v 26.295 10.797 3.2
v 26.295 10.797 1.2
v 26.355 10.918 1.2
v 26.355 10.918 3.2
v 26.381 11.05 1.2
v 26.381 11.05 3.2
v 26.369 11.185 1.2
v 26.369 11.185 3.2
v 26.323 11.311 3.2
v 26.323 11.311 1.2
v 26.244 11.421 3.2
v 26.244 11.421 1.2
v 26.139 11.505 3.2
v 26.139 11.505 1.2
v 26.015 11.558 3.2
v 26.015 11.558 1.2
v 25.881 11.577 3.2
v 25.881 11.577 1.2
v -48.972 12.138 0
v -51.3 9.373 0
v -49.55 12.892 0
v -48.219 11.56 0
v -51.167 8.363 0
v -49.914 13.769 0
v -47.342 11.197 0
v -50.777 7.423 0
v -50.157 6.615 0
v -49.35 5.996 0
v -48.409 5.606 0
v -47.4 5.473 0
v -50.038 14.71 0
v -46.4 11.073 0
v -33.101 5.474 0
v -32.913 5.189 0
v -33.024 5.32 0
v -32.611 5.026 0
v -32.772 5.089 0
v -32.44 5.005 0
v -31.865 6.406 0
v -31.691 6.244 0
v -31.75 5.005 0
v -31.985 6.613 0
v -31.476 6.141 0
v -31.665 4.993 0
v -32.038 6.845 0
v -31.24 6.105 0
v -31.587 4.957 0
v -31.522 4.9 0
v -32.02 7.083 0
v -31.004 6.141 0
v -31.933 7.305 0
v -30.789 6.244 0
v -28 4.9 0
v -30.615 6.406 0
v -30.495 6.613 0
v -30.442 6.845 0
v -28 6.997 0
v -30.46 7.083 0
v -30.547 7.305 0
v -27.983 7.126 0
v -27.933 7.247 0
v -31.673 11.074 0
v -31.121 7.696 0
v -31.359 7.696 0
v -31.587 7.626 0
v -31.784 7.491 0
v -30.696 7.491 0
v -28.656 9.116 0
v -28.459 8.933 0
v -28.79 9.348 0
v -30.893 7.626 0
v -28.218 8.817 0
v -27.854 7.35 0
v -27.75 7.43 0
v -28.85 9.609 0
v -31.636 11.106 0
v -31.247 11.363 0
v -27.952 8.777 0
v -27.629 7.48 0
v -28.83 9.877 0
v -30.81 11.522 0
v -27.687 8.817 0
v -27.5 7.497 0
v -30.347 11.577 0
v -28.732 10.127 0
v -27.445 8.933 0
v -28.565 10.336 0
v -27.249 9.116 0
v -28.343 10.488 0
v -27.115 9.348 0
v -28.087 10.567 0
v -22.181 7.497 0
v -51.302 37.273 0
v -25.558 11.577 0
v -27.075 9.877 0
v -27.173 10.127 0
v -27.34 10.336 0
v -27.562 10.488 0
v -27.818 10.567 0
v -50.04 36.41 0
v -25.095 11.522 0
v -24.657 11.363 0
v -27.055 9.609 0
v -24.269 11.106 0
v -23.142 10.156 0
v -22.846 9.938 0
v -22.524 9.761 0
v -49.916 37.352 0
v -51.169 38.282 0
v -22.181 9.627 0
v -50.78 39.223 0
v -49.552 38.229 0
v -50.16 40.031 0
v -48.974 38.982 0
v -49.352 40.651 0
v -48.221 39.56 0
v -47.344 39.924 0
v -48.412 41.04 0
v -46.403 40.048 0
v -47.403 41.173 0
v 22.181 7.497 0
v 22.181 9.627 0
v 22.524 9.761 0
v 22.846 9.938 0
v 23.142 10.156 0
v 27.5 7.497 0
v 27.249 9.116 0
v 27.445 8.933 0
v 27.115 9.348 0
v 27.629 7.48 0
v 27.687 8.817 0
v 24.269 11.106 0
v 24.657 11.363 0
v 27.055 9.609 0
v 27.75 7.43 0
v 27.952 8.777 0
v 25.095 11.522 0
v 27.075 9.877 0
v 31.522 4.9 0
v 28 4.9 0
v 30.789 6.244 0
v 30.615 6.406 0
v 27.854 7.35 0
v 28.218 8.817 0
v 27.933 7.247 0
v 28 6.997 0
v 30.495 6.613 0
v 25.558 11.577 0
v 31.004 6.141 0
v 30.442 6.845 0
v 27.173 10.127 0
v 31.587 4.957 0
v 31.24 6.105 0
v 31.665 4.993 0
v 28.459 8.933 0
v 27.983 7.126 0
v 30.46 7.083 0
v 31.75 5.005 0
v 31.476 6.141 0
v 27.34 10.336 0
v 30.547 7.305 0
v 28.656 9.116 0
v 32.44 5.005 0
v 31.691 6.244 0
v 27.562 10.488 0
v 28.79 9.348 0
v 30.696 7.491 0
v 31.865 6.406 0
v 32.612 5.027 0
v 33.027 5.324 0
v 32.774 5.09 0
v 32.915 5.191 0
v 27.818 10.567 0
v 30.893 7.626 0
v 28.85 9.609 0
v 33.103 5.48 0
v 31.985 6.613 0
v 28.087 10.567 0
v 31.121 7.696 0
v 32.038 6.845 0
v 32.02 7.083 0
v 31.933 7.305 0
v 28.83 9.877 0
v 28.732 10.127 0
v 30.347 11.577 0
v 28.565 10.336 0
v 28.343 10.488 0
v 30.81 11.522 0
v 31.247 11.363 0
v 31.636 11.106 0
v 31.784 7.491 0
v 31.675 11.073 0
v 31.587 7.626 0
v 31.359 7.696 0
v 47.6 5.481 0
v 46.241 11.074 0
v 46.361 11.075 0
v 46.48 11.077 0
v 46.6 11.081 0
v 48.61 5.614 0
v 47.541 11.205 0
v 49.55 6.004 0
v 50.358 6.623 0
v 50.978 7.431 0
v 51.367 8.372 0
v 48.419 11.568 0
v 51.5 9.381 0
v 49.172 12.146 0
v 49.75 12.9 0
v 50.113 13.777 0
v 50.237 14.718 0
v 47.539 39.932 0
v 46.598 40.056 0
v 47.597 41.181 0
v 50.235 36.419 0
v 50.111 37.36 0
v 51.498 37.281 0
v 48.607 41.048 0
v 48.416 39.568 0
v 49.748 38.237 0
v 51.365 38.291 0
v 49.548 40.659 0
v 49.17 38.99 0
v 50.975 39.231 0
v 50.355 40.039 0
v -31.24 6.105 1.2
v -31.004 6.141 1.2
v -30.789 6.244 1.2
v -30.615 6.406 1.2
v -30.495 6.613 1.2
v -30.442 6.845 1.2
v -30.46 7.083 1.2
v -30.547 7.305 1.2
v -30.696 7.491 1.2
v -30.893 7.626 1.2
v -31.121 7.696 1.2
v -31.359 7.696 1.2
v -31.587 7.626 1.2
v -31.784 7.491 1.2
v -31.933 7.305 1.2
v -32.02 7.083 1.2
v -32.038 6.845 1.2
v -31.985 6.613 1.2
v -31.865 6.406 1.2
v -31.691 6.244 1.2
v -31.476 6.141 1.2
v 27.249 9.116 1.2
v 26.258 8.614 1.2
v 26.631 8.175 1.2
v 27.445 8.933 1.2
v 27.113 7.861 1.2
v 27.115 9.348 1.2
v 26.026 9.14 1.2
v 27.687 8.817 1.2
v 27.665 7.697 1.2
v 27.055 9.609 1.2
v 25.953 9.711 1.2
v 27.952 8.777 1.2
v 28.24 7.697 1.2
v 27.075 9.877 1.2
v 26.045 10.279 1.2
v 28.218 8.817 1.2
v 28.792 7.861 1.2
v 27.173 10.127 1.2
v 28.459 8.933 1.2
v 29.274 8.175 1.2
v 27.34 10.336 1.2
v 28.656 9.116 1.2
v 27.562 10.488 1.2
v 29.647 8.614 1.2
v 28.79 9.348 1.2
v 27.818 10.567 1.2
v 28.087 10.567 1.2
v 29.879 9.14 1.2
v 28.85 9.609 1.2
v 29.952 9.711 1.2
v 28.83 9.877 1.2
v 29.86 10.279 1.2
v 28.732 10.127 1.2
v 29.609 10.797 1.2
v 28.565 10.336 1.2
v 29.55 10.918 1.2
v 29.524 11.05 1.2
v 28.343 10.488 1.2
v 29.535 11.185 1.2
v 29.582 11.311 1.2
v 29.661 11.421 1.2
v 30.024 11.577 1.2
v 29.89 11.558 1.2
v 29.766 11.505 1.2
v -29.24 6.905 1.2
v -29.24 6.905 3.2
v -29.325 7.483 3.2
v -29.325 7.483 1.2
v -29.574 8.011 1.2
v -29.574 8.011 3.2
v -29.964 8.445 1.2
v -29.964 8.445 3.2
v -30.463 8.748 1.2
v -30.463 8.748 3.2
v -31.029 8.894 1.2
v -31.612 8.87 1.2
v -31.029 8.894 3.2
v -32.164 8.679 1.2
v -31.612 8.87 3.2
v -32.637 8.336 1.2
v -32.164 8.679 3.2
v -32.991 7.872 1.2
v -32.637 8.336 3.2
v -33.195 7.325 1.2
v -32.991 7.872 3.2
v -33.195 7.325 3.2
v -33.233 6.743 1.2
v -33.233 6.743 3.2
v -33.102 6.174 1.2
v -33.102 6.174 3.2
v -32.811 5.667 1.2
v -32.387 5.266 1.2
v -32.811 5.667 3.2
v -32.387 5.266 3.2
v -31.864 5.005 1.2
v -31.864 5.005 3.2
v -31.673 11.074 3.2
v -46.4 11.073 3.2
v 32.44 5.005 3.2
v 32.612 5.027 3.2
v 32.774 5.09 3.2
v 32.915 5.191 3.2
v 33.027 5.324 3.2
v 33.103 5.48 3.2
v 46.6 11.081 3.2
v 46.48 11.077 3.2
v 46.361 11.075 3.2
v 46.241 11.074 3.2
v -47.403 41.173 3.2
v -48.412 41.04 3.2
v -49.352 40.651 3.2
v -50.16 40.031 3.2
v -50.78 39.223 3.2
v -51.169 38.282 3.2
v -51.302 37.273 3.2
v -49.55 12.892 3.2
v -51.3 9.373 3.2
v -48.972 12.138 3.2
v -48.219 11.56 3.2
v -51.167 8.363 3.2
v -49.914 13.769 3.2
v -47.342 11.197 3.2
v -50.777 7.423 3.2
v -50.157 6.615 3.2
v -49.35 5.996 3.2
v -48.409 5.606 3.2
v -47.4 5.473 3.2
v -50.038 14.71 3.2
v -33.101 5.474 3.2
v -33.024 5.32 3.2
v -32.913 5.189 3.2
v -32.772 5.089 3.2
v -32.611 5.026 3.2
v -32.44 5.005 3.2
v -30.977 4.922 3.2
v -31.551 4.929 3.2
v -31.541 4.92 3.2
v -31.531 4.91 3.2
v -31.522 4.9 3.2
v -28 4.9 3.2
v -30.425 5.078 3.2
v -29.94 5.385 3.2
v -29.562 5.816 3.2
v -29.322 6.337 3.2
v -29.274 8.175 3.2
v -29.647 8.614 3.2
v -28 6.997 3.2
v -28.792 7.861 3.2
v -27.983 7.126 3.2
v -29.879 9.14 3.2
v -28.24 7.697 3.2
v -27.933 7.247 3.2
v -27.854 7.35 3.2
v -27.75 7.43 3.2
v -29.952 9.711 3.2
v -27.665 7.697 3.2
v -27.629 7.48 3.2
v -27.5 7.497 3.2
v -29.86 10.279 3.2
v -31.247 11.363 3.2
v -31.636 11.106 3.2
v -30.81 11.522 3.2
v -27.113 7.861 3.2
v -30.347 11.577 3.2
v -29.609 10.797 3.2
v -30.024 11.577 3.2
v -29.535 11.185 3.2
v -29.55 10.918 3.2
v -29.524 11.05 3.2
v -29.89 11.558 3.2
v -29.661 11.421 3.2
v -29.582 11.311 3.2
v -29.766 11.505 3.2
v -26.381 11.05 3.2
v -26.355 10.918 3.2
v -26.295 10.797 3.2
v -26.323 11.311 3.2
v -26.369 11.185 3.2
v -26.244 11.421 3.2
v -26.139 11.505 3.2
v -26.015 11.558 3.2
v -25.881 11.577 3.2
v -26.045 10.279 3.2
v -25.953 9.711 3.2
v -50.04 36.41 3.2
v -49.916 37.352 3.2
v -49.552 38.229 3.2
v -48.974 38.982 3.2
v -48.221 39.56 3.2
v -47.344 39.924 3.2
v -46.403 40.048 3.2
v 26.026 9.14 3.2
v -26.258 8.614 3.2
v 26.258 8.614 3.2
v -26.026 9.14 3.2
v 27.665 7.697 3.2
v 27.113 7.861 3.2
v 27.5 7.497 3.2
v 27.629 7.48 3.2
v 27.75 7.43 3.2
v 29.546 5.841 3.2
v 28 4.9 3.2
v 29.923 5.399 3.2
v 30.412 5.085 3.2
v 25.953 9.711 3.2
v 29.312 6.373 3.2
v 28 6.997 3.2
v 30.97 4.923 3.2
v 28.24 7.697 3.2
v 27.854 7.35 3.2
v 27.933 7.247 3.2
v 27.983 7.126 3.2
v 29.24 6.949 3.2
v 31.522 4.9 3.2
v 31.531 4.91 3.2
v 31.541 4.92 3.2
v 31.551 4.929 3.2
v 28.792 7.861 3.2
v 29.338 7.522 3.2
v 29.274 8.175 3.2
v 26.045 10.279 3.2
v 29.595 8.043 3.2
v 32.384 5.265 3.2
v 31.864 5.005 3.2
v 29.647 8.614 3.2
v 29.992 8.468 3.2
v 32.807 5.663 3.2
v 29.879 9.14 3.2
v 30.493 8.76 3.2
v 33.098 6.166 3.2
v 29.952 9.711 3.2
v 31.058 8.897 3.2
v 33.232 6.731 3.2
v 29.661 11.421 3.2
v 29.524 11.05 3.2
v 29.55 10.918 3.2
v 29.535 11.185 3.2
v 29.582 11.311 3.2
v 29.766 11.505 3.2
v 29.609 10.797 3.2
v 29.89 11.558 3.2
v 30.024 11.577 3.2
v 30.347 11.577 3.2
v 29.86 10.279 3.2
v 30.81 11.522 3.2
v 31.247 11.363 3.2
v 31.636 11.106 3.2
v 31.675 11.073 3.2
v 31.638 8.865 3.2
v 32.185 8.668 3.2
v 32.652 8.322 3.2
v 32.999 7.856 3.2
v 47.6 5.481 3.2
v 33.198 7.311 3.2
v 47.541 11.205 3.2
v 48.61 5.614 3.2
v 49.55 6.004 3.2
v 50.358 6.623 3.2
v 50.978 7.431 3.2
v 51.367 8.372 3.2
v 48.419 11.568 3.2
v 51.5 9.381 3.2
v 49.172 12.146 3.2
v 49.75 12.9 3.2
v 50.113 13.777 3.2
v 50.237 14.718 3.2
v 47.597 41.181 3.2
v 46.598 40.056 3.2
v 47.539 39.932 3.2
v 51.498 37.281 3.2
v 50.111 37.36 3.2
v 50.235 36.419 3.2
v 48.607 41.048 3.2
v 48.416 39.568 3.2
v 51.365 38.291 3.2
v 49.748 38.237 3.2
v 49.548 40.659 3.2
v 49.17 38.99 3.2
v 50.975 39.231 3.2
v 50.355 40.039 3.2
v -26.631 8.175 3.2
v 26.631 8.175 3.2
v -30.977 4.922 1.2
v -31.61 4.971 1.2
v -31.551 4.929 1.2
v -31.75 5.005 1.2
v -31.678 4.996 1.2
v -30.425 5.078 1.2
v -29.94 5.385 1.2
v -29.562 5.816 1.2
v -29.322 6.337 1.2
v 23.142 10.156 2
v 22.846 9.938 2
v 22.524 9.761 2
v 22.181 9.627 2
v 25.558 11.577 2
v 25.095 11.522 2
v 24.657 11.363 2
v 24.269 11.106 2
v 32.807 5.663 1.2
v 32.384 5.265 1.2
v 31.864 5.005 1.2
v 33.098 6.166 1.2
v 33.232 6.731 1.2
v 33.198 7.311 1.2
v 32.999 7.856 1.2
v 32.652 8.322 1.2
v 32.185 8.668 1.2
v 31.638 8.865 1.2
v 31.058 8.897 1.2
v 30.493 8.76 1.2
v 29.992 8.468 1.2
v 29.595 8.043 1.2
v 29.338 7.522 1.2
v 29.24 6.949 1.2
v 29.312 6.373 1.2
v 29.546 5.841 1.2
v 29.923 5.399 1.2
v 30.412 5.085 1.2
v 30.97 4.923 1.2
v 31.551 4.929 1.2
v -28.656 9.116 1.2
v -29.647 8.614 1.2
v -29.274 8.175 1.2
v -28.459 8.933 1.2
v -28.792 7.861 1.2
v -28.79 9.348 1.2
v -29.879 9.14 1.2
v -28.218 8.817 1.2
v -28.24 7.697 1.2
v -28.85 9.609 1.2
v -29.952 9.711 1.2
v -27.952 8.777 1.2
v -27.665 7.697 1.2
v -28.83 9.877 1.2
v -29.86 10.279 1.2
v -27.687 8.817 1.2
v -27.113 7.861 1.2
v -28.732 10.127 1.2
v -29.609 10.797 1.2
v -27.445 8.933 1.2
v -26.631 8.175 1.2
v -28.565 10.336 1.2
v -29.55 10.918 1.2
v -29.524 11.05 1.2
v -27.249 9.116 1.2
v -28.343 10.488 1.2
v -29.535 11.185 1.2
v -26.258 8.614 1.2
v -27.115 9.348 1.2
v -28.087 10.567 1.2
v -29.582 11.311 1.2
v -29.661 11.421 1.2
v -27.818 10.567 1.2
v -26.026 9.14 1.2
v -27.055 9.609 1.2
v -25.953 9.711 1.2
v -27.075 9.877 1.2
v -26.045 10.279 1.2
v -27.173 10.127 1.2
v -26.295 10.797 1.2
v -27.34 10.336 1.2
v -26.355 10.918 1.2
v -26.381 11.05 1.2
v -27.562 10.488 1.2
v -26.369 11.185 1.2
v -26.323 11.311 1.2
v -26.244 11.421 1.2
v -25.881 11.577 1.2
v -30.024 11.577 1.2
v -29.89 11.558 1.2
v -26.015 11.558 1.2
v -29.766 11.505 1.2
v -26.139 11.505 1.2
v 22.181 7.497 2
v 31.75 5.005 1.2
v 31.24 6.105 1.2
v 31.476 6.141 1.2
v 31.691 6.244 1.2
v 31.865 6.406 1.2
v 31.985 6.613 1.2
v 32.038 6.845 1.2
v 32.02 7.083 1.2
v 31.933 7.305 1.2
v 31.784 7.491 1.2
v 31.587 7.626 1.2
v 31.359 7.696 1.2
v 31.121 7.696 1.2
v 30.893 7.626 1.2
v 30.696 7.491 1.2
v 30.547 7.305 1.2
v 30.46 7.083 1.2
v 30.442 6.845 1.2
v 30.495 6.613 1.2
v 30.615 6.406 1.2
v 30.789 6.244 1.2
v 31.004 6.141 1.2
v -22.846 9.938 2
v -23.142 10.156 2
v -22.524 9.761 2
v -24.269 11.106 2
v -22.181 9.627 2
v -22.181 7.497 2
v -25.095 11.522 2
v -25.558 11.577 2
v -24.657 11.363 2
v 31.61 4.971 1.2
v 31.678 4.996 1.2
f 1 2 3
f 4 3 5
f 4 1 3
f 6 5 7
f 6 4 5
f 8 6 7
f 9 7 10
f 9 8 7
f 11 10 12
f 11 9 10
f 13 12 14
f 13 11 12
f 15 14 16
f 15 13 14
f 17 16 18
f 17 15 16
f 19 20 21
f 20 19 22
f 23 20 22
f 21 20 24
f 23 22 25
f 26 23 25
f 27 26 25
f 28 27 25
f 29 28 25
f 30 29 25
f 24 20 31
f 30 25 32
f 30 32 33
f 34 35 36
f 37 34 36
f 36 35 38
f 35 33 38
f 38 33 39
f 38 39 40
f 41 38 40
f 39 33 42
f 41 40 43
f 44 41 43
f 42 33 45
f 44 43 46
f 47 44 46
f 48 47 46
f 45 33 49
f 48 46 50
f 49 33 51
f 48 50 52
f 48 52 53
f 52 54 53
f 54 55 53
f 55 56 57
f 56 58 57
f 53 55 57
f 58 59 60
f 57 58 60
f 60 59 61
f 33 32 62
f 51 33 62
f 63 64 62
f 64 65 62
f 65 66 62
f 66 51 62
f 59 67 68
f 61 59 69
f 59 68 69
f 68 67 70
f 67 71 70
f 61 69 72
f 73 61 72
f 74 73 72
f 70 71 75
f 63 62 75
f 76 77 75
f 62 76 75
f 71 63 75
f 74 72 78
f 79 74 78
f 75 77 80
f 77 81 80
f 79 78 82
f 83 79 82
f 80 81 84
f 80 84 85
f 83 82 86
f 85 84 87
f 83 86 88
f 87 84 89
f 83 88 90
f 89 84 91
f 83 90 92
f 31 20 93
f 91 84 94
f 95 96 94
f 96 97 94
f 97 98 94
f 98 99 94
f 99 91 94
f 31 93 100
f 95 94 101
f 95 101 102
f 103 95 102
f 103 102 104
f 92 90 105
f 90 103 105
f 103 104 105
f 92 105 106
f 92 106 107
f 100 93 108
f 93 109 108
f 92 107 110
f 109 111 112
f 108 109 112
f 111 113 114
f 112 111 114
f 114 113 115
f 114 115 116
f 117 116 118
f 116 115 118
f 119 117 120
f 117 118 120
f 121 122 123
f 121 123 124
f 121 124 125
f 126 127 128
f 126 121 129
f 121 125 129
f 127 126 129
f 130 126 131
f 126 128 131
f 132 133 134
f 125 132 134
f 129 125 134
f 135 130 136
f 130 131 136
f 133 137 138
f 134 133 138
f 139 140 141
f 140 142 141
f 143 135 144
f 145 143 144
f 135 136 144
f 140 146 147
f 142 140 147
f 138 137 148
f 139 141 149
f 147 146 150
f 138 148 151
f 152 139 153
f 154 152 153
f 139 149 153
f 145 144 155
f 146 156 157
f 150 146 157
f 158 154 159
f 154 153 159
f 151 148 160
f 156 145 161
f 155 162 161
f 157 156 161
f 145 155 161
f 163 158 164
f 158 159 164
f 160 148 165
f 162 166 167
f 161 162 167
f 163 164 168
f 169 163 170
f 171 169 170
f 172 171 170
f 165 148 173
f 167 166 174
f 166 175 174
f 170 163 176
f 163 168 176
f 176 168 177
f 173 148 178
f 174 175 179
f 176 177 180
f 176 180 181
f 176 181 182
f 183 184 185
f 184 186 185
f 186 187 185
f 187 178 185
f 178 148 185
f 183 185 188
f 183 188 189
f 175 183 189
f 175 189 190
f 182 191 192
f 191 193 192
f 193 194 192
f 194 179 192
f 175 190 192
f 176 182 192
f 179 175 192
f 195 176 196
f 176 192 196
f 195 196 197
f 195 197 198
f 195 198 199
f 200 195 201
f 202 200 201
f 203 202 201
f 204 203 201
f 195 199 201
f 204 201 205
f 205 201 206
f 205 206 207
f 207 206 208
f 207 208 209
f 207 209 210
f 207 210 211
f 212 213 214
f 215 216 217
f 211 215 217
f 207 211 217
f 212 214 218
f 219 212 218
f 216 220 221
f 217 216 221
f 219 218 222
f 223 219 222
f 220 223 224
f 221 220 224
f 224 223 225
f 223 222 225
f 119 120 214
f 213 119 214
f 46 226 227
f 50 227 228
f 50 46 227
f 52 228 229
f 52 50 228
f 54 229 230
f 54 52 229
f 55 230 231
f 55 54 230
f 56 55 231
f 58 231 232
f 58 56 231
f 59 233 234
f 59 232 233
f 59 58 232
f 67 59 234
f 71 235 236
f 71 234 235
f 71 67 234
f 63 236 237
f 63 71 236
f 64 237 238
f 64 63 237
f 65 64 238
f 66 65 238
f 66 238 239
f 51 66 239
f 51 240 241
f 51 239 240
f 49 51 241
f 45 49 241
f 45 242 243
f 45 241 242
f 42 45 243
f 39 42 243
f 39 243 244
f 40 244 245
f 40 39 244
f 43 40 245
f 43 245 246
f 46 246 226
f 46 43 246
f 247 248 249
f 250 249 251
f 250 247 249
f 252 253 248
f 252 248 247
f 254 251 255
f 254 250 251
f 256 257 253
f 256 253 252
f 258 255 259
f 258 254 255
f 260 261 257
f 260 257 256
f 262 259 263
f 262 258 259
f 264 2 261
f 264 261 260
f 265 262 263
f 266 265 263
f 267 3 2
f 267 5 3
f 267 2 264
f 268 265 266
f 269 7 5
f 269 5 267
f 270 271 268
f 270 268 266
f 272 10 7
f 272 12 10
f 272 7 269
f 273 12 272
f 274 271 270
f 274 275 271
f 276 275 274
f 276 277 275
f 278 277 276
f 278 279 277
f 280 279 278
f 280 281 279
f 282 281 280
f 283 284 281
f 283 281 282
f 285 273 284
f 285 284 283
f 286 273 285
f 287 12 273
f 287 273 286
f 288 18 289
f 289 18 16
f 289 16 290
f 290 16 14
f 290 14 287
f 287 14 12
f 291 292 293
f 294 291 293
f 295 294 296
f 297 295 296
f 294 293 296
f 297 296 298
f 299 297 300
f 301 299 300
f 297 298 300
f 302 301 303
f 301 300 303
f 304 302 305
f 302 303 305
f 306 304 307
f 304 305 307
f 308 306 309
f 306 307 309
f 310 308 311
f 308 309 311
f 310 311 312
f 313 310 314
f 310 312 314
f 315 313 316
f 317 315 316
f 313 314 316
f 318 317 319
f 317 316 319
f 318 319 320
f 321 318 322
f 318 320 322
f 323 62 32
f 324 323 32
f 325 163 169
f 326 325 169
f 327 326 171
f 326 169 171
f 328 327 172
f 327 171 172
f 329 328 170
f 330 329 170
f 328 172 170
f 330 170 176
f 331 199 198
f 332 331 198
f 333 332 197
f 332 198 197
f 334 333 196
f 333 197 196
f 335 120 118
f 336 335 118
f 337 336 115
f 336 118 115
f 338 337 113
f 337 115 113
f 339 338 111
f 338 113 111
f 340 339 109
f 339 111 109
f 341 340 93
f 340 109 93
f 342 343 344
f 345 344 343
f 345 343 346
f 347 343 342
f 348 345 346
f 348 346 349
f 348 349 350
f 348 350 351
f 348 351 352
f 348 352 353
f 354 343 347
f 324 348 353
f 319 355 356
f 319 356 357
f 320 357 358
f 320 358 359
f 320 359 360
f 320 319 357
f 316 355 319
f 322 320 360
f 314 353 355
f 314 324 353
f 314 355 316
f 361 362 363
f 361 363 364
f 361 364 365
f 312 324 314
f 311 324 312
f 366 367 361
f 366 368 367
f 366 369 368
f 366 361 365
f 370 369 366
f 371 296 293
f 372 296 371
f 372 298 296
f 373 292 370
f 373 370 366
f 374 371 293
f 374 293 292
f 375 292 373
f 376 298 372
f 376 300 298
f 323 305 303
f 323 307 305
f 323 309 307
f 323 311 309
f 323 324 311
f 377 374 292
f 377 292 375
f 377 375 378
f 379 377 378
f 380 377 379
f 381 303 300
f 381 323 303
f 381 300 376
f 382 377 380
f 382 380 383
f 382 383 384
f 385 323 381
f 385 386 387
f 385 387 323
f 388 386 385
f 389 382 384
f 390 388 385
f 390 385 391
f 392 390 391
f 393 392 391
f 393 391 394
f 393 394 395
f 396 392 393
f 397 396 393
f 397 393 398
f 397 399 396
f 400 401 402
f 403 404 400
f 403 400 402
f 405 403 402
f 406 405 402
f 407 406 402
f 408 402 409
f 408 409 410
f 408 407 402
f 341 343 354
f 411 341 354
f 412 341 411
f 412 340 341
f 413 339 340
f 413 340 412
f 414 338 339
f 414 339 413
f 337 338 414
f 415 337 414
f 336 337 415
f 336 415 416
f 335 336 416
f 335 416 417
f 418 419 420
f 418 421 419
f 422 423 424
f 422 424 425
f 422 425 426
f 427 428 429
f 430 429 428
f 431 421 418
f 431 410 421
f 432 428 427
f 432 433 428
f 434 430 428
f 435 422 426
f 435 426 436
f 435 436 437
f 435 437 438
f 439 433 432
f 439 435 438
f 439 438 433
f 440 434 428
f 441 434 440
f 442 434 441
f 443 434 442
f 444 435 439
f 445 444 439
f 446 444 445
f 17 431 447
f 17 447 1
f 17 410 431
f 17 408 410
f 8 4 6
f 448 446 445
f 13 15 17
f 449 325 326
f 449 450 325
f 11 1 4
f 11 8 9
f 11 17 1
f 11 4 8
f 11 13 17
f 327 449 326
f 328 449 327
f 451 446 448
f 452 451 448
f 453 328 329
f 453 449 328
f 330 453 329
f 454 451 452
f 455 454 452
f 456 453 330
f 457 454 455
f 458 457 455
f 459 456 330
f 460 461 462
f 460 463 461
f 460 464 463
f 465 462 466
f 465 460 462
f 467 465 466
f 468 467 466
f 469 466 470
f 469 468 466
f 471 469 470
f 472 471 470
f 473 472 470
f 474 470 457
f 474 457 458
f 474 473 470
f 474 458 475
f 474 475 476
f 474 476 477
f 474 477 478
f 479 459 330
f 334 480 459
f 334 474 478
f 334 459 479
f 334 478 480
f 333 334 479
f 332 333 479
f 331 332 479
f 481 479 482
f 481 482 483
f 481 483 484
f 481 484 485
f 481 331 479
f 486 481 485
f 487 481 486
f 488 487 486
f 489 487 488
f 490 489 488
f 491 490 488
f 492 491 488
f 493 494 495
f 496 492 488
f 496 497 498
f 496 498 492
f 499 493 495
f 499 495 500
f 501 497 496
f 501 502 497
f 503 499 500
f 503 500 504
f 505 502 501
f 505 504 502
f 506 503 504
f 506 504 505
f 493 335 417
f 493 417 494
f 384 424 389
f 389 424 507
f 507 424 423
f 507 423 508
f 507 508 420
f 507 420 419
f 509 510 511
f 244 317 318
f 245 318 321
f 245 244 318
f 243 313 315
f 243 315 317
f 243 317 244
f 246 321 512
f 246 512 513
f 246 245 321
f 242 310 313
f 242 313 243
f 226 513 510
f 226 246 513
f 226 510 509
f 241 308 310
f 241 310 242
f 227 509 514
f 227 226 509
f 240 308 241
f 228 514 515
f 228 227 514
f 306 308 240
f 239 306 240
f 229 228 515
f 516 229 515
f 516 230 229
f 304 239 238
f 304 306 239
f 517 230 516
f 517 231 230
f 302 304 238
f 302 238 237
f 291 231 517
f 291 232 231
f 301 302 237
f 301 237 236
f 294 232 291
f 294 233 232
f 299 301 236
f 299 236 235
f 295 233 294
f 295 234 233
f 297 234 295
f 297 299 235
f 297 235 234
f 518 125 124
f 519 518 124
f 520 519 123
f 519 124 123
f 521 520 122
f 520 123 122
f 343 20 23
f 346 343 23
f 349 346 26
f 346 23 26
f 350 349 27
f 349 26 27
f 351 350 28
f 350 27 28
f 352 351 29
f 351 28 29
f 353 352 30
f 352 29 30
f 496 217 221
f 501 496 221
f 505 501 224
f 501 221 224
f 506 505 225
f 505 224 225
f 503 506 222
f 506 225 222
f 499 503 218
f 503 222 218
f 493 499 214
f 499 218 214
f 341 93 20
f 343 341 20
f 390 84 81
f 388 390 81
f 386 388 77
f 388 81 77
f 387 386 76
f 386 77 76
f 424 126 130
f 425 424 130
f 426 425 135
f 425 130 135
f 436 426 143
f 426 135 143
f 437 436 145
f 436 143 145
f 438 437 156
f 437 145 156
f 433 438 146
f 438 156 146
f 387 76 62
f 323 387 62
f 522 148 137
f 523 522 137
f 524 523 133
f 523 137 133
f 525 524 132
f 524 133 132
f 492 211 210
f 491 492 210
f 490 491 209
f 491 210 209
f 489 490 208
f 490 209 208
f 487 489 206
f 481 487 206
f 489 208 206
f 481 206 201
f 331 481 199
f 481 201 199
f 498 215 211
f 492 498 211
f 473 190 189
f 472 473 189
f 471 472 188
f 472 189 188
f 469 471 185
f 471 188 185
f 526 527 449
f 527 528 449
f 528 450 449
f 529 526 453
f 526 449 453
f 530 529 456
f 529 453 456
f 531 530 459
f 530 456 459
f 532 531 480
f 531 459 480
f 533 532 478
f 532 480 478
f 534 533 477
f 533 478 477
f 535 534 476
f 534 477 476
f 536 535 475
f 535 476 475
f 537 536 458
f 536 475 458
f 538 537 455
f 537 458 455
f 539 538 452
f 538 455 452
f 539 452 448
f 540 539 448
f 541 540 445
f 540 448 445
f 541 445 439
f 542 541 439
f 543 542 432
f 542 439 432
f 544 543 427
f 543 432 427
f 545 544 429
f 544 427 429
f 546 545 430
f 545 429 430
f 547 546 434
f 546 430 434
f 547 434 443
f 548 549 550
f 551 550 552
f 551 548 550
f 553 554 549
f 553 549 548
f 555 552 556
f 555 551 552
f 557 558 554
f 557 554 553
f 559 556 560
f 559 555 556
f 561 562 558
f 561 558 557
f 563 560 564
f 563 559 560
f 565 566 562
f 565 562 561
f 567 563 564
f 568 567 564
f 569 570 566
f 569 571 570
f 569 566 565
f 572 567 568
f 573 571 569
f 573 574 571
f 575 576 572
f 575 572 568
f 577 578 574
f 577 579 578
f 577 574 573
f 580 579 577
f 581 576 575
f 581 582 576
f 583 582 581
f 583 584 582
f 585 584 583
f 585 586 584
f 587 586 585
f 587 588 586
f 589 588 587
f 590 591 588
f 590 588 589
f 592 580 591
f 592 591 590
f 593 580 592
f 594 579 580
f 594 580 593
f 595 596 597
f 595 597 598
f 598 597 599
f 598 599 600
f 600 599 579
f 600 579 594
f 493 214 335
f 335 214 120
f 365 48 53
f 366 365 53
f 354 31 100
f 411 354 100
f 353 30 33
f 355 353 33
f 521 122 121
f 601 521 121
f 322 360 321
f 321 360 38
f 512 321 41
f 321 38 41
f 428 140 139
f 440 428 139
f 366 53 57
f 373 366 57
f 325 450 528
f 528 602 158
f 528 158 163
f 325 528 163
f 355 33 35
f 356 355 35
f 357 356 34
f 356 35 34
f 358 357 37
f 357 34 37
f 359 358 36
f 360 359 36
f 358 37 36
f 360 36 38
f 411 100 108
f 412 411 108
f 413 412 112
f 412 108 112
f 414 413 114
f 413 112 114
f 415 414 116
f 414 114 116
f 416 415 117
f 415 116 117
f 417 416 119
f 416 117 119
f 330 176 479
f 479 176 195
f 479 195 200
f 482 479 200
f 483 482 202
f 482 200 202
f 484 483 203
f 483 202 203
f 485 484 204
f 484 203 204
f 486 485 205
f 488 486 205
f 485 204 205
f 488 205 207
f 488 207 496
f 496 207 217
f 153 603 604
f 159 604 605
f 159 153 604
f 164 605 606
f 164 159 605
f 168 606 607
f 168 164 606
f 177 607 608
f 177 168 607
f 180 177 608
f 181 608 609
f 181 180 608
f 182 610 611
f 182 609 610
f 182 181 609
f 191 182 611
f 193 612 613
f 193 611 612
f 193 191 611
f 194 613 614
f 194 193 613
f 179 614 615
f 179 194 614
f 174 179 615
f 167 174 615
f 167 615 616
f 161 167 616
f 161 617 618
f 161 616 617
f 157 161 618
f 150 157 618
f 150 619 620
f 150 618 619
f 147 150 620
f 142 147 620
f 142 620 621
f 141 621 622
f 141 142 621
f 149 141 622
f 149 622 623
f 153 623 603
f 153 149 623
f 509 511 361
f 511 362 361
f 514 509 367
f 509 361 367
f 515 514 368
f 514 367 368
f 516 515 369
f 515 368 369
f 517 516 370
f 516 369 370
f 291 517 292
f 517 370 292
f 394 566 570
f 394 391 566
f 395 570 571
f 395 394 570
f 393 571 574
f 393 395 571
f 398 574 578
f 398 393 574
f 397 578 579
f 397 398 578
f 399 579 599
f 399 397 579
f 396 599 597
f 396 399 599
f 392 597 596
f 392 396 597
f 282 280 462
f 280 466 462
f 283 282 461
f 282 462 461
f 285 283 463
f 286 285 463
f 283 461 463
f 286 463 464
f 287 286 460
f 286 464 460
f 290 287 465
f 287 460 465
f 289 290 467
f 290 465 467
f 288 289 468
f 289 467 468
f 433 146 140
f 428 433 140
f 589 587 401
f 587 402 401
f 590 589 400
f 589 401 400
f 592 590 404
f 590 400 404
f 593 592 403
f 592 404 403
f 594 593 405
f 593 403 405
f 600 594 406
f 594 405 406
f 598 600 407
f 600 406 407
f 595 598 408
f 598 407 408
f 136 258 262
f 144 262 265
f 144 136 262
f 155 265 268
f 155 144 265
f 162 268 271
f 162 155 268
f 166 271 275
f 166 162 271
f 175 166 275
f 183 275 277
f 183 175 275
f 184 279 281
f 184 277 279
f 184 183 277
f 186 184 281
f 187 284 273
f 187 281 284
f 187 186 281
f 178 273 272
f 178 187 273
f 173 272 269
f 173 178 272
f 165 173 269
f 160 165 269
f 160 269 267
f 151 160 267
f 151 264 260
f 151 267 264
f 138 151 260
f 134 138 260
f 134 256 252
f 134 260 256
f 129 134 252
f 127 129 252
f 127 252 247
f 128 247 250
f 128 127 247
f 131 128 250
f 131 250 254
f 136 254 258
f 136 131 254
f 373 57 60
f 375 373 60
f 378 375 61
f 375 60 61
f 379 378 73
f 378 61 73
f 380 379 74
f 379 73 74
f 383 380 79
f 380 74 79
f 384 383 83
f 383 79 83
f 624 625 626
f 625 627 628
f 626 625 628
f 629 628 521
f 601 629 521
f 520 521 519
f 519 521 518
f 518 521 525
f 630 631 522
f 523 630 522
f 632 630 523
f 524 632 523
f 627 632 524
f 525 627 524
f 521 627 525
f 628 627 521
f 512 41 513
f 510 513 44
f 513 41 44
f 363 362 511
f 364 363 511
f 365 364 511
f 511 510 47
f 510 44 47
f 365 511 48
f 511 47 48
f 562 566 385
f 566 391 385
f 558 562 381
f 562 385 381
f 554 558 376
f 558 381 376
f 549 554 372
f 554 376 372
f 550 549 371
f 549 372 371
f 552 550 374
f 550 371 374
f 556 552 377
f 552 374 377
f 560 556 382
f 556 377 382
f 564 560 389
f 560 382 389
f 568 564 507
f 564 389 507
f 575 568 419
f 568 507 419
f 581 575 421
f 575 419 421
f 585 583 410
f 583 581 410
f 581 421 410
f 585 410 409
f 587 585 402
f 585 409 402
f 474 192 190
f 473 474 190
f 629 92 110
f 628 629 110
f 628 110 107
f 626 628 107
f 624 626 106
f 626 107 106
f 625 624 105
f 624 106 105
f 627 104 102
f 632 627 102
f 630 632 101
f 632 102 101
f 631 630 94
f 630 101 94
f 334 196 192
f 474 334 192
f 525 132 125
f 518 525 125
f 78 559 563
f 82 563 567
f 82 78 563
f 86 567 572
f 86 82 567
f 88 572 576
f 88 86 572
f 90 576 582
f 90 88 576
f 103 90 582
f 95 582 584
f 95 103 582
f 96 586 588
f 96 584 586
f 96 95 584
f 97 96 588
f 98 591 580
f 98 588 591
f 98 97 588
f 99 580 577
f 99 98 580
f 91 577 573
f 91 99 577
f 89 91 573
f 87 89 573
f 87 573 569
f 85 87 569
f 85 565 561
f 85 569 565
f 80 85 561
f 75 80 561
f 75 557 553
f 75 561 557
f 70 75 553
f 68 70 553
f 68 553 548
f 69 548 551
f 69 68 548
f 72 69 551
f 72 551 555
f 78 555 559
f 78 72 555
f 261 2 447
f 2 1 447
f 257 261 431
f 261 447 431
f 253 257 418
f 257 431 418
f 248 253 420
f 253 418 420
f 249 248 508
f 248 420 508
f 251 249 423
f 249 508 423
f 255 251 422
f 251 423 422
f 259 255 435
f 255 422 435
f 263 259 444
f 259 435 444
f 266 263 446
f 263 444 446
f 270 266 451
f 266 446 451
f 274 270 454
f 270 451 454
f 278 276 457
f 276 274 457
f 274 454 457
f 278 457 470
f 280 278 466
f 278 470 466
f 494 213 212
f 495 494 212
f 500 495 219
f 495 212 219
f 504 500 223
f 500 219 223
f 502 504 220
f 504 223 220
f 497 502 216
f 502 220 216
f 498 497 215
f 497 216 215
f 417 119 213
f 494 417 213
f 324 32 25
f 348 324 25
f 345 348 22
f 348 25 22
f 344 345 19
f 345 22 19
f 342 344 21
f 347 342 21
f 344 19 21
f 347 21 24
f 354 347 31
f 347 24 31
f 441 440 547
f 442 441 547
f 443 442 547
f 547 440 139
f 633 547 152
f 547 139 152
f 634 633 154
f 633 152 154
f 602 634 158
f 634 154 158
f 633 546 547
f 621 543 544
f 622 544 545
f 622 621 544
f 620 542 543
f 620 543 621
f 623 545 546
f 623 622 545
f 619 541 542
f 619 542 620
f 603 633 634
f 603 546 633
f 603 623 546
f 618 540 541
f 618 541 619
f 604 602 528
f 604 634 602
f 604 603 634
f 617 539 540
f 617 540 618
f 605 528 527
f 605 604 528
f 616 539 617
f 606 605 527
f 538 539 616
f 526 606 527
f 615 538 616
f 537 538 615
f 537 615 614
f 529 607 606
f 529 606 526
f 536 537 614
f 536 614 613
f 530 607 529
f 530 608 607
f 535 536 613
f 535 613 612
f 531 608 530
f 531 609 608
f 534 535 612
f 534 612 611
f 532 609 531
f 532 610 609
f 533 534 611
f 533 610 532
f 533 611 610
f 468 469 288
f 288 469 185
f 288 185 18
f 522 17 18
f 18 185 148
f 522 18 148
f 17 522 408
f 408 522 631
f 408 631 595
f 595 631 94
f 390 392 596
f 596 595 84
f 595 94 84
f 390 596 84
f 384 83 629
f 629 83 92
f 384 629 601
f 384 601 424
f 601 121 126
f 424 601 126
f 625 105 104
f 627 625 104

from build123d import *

# Parameters (mm, degrees)
SKETCH_1_R          = 0.9
SKETCH_1_R_2        = 0.8
EXTRUDE_1_DEPTH     = 3.2
EXTRUDE_1_2_DEPTH   = 3.2
SKETCH_2_W          = 51.115590172
SKETCH_2_H          = 4.08
EXTRUDE_2_DEPTH     = 1.2
EXTRUDE_START       = -3.2
EXTRUDE_3_DEPTH     = 3.2
SKETCH_4_R          = 2
CUT_EXTRUDE_1_DEPTH = 2
FILLET_1_R          = 0.5


with BuildPart() as part:
    # 草图1 → 凸台-拉伸1 (new body)
    with BuildSketch(Plane.XY):
        with BuildLine():
            Line((-32.44, 5.005), (-31.75, 5.005))
            ThreePointArc((-31.75, 5.005), (-31.624500996, 4.977488532), (-31.522019738, 4.9))
            Line((-31.522019738, 4.9), (-28, 4.9))
            Line((-28, 4.9), (-28, 6.996662954))
            ThreePointArc((-28, 6.996662954), (-27.853553391, 7.350216345), (-27.5, 7.496662954))
            Line((-27.5, 7.496662954), (-22.181386307, 7.496662954))
            Line((-22.181386307, 7.496662954), (-22.181386307, 9.626936565))
            ThreePointArc((-22.181386307, 9.626936565), (-22.687871835, 9.843944297), (-23.142051903, 10.155938547))
            Line((-23.142051903, 10.155938547), (-24.268653026, 11.105751817))
            ThreePointArc((-24.268653026, 11.105751817), (-24.871565433, 11.455249887), (-25.557795086, 11.576662954))
            Line((-25.557795086, 11.576662954), (-30.347104952, 11.576662954))
            ThreePointArc((-30.347104952, 11.576662954), (-31.033334605, 11.455249887), (-31.636247011, 11.105751817))
            Line((-31.636247011, 11.105751817), (-32.42914206, 10.437278989))
            ThreePointArc((-32.42914206, 10.437278989), (-32.9535992, 9.751314044), (-33.14, 8.908190127))
            Line((-33.14, 8.908190127), (-33.14, 5.705))
            ThreePointArc((-33.14, 5.705), (-32.934974747, 5.210025253), (-32.44, 5.005))
        make_face()
        with Locations(Location((-27.952450019, 9.676662954, 0), (0, 0, 270))):
            Circle(SKETCH_1_R, mode=Mode.SUBTRACT)
        with Locations(Location((-31.24, 6.905, 0), (0, 0, 270))):
            Circle(SKETCH_1_R_2, mode=Mode.SUBTRACT)
    extrude(amount=EXTRUDE_1_DEPTH)



with BuildPart() as body_2:
    # 草图1 → Extrude 1 2 (new body)
    with BuildSketch(Plane.XY):
        with BuildLine():
            Line((28, 6.996662954), (28, 4.9))
            Line((28, 4.9), (31.522019738, 4.9))
            ThreePointArc((31.522019738, 4.9), (31.624500996, 4.977488532), (31.75, 5.005))
            Line((31.75, 5.005), (32.44, 5.005))
            ThreePointArc((32.44, 5.005), (32.934974747, 5.210025253), (33.14, 5.705))
            Line((33.14, 5.705), (33.14, 8.908190127))
            ThreePointArc((33.14, 8.908190127), (32.9535992, 9.751314044), (32.42914206, 10.437278989))
            Line((32.42914206, 10.437278989), (31.636247011, 11.105751817))
            ThreePointArc((31.636247011, 11.105751817), (31.033334605, 11.455249887), (30.347104952, 11.576662954))
            Line((30.347104952, 11.576662954), (25.557795086, 11.576662954))
            ThreePointArc((25.557795086, 11.576662954), (24.871565433, 11.455249887), (24.268653026, 11.105751817))
            Line((24.268653026, 11.105751817), (23.142051903, 10.155938547))
            ThreePointArc((23.142051903, 10.155938547), (22.687871835, 9.843944297), (22.181386307, 9.626936565))
            Line((22.181386307, 9.626936565), (22.181386307, 7.496662954))
            Line((22.181386307, 7.496662954), (27.5, 7.496662954))
            ThreePointArc((27.5, 7.496662954), (27.853553391, 7.350216345), (28, 6.996662954))
        make_face()
        with Locations(Location((27.952450019, 9.676662954, 0), (0, 0, 270))):
            Circle(SKETCH_1_R, mode=Mode.SUBTRACT)
        with Locations(Location((31.24, 6.905, 0), (0, 0, 270))):
            Circle(SKETCH_1_R_2, mode=Mode.SUBTRACT)
    extrude(amount=EXTRUDE_1_2_DEPTH)


with BuildPart() as part_1:
    add(part.part)

    add(body_2.part)  # 凸台-拉伸2 merges body 2
    # 草图2 → 凸台-拉伸2 (add)
    with BuildSketch(Plane.XY.offset(3.2)):
        with Locations((0, 9.536662954)):
            Rectangle(SKETCH_2_W, SKETCH_2_H)
    extrude(amount=-EXTRUDE_2_DEPTH)

    # 草图3 → 凸台-拉伸3 (add)
    with BuildSketch(Plane.XY.offset(3.2).offset(EXTRUDE_START)):
        with BuildLine():
            Line((46.240904424, 11.074408529), (31.674834812, 11.073219269))
            Line((31.674834812, 11.073219269), (32.42914206, 10.437278989))
            ThreePointArc((32.42914206, 10.437278989), (32.9535992, 9.751314044), (33.14, 8.908190127))
            Line((33.14, 8.908190127), (33.14, 5.705))
            ThreePointArc((33.14, 5.705), (33.130629249, 5.59084554), (33.102767884, 5.479747403))
            Line((33.102767884, 5.479747403), (47.600381988, 5.480931075))
            ThreePointArc((47.600381988, 5.480931075), (50.358005162, 6.623439781), (51.500063555, 9.381249481))
            Line((51.500063555, 9.381249481), (51.497785633, 37.281249388))
            ThreePointArc((51.497785633, 37.281249388), (50.355276927, 40.038872563), (47.597467227, 41.180930956))
            Line((47.597467227, 41.180930956), (-47.402532456, 41.17317459))
            ThreePointArc((-47.402532456, 41.17317459), (-50.160155631, 40.030665884), (-51.302214024, 37.272856184))
            Line((-51.302214024, 37.272856184), (-51.299936102, 9.372856277))
            ThreePointArc((-51.299936102, 9.372856277), (-50.157427396, 6.615233102), (-47.399617696, 5.473174709))
            Line((-47.399617696, 5.473174709), (-33.10090616, 5.474342141))
            ThreePointArc((-33.10090616, 5.474342141), (-33.130157341, 5.58802631), (-33.14, 5.705))
            Line((-33.14, 5.705), (-33.14, 8.908190127))
            ThreePointArc((-33.14, 8.908190127), (-32.9535992, 9.751314044), (-32.42914206, 10.437278989))
            Line((-32.42914206, 10.437278989), (-31.673318835, 11.074497357))
            Line((-31.673318835, 11.074497357), (-46.40016763, 11.073294969))
            ThreePointArc((-46.40016763, 11.073294969), (-48.972219468, 12.138427704), (-50.037772184, 14.71030558))
            Line((-50.037772184, 14.71030558), (-50.039543904, 36.410348688))
            ThreePointArc((-50.039543904, 36.410348688), (-48.974411169, 38.982400526), (-46.402533293, 40.047953242))
            Line((-46.402533293, 40.047953242), (46.597651817, 40.055546331))
            ThreePointArc((46.597651817, 40.055546331), (49.169703655, 38.990413596), (50.235256371, 36.41853572))
            Line((50.235256371, 36.41853572), (50.237028092, 14.718492612))
            ThreePointArc((50.237028092, 14.718492612), (49.171895357, 12.146440774), (46.600017481, 11.080888058))
            ThreePointArc((46.600017481, 11.080888058), (46.420490045, 11.076035874), (46.240904424, 11.074408529))
        make_face()
    extrude(amount=EXTRUDE_3_DEPTH)

    # 草图4 → 切除-拉伸1 (cut)
    with BuildSketch(Plane.XY.offset(3.2)):
        with Locations((-27.952450019, 9.676662954)):
            Circle(SKETCH_4_R)
        with Locations((27.952450019, 9.676662954)):
            Circle(SKETCH_4_R)
        with Locations((-31.24, 6.905)):
            Circle(SKETCH_4_R)
        with Locations((31.24, 6.905)):
            Circle(SKETCH_4_R)
    extrude(amount=-CUT_EXTRUDE_1_DEPTH, mode=Mode.SUBTRACT)

    # 圆角1
    fillet_1_edges = [part_1.edges().sort_by_distance(p)[0] for p in [
        (-27.327950219, 11.576662954, 2.2),
        (-28.576949819, 11.576662954, 2.2),
        (28.576949819, 11.576662954, 2.2),
        (27.327950219, 11.576662954, 2.2),
    ]]
    fillet(fillet_1_edges, radius=FILLET_1_R)


solid = part_1.part
